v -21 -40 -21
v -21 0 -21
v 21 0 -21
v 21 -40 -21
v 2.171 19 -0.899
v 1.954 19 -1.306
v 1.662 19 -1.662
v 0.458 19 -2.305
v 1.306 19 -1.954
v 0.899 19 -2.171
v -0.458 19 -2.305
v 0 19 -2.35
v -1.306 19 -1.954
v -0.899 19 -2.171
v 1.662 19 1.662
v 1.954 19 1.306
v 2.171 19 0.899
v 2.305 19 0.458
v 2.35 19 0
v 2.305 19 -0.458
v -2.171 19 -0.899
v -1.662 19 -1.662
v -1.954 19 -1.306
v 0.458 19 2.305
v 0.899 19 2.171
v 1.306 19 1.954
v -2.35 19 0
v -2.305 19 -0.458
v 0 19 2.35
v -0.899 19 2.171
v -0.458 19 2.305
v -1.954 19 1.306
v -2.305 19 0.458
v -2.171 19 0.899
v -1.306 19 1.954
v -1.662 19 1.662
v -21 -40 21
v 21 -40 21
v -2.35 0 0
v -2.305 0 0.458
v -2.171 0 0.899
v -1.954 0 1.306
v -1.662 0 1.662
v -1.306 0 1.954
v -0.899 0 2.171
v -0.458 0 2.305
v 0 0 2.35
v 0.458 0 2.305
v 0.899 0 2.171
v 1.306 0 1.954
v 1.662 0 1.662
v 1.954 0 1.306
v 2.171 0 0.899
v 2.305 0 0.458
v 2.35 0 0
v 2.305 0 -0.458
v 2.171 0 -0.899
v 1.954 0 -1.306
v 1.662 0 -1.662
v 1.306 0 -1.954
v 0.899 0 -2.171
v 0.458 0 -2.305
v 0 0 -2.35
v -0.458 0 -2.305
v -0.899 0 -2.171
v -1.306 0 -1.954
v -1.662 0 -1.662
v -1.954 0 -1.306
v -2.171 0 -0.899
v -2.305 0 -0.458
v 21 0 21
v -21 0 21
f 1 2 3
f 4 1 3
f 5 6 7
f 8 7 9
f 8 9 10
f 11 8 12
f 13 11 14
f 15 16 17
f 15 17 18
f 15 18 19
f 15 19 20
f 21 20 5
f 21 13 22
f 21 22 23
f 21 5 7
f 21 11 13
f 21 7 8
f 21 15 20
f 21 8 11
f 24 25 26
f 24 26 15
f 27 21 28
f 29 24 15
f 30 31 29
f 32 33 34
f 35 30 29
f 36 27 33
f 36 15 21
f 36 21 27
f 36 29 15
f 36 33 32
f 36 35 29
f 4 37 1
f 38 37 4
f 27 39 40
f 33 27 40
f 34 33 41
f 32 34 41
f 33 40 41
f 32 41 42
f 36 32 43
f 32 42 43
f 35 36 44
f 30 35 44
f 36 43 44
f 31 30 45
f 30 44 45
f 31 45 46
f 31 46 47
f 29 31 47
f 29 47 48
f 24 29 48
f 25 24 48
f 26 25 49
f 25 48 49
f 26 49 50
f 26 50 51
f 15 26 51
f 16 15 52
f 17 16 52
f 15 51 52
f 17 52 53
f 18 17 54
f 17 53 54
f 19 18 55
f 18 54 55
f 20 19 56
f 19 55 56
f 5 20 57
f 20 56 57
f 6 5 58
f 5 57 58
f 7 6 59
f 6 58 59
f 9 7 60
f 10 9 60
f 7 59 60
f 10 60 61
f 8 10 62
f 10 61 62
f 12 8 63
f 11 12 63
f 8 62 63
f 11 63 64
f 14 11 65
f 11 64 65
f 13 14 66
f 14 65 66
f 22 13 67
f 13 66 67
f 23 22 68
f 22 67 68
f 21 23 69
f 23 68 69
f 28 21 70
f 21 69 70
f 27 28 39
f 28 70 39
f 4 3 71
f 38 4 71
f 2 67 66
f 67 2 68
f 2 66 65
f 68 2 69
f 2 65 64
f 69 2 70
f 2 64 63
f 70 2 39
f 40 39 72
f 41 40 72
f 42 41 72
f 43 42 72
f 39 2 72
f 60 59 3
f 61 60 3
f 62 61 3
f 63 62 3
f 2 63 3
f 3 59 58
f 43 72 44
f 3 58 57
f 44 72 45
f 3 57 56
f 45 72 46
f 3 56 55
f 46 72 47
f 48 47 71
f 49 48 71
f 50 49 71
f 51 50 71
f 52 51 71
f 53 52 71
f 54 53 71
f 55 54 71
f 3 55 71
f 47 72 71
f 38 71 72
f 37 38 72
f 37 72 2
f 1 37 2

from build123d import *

# Parameters (mm, degrees)
F1_DEPTH = 40
F2_R     = 2.35
F3_DEPTH = 19


with BuildPart() as f1:
    # F0 (on Front) → F1 (new body)
    with BuildSketch(Plane.XZ):
        Polygon((-21, 21), (-21, 0), (-21, -21), (0, -21), (21, -21), (21, 0), (21, 21), (0, 21), align=None)
    extrude(amount=F1_DEPTH)

    # F2 (on face) → F3 (join)
    with BuildSketch(Plane(origin=(0, 0, 0), x_dir=(-1, 0, 0), z_dir=(0, 1, 0))):
        Circle(F2_R)
    extrude(amount=F3_DEPTH)


solid = f1.part
